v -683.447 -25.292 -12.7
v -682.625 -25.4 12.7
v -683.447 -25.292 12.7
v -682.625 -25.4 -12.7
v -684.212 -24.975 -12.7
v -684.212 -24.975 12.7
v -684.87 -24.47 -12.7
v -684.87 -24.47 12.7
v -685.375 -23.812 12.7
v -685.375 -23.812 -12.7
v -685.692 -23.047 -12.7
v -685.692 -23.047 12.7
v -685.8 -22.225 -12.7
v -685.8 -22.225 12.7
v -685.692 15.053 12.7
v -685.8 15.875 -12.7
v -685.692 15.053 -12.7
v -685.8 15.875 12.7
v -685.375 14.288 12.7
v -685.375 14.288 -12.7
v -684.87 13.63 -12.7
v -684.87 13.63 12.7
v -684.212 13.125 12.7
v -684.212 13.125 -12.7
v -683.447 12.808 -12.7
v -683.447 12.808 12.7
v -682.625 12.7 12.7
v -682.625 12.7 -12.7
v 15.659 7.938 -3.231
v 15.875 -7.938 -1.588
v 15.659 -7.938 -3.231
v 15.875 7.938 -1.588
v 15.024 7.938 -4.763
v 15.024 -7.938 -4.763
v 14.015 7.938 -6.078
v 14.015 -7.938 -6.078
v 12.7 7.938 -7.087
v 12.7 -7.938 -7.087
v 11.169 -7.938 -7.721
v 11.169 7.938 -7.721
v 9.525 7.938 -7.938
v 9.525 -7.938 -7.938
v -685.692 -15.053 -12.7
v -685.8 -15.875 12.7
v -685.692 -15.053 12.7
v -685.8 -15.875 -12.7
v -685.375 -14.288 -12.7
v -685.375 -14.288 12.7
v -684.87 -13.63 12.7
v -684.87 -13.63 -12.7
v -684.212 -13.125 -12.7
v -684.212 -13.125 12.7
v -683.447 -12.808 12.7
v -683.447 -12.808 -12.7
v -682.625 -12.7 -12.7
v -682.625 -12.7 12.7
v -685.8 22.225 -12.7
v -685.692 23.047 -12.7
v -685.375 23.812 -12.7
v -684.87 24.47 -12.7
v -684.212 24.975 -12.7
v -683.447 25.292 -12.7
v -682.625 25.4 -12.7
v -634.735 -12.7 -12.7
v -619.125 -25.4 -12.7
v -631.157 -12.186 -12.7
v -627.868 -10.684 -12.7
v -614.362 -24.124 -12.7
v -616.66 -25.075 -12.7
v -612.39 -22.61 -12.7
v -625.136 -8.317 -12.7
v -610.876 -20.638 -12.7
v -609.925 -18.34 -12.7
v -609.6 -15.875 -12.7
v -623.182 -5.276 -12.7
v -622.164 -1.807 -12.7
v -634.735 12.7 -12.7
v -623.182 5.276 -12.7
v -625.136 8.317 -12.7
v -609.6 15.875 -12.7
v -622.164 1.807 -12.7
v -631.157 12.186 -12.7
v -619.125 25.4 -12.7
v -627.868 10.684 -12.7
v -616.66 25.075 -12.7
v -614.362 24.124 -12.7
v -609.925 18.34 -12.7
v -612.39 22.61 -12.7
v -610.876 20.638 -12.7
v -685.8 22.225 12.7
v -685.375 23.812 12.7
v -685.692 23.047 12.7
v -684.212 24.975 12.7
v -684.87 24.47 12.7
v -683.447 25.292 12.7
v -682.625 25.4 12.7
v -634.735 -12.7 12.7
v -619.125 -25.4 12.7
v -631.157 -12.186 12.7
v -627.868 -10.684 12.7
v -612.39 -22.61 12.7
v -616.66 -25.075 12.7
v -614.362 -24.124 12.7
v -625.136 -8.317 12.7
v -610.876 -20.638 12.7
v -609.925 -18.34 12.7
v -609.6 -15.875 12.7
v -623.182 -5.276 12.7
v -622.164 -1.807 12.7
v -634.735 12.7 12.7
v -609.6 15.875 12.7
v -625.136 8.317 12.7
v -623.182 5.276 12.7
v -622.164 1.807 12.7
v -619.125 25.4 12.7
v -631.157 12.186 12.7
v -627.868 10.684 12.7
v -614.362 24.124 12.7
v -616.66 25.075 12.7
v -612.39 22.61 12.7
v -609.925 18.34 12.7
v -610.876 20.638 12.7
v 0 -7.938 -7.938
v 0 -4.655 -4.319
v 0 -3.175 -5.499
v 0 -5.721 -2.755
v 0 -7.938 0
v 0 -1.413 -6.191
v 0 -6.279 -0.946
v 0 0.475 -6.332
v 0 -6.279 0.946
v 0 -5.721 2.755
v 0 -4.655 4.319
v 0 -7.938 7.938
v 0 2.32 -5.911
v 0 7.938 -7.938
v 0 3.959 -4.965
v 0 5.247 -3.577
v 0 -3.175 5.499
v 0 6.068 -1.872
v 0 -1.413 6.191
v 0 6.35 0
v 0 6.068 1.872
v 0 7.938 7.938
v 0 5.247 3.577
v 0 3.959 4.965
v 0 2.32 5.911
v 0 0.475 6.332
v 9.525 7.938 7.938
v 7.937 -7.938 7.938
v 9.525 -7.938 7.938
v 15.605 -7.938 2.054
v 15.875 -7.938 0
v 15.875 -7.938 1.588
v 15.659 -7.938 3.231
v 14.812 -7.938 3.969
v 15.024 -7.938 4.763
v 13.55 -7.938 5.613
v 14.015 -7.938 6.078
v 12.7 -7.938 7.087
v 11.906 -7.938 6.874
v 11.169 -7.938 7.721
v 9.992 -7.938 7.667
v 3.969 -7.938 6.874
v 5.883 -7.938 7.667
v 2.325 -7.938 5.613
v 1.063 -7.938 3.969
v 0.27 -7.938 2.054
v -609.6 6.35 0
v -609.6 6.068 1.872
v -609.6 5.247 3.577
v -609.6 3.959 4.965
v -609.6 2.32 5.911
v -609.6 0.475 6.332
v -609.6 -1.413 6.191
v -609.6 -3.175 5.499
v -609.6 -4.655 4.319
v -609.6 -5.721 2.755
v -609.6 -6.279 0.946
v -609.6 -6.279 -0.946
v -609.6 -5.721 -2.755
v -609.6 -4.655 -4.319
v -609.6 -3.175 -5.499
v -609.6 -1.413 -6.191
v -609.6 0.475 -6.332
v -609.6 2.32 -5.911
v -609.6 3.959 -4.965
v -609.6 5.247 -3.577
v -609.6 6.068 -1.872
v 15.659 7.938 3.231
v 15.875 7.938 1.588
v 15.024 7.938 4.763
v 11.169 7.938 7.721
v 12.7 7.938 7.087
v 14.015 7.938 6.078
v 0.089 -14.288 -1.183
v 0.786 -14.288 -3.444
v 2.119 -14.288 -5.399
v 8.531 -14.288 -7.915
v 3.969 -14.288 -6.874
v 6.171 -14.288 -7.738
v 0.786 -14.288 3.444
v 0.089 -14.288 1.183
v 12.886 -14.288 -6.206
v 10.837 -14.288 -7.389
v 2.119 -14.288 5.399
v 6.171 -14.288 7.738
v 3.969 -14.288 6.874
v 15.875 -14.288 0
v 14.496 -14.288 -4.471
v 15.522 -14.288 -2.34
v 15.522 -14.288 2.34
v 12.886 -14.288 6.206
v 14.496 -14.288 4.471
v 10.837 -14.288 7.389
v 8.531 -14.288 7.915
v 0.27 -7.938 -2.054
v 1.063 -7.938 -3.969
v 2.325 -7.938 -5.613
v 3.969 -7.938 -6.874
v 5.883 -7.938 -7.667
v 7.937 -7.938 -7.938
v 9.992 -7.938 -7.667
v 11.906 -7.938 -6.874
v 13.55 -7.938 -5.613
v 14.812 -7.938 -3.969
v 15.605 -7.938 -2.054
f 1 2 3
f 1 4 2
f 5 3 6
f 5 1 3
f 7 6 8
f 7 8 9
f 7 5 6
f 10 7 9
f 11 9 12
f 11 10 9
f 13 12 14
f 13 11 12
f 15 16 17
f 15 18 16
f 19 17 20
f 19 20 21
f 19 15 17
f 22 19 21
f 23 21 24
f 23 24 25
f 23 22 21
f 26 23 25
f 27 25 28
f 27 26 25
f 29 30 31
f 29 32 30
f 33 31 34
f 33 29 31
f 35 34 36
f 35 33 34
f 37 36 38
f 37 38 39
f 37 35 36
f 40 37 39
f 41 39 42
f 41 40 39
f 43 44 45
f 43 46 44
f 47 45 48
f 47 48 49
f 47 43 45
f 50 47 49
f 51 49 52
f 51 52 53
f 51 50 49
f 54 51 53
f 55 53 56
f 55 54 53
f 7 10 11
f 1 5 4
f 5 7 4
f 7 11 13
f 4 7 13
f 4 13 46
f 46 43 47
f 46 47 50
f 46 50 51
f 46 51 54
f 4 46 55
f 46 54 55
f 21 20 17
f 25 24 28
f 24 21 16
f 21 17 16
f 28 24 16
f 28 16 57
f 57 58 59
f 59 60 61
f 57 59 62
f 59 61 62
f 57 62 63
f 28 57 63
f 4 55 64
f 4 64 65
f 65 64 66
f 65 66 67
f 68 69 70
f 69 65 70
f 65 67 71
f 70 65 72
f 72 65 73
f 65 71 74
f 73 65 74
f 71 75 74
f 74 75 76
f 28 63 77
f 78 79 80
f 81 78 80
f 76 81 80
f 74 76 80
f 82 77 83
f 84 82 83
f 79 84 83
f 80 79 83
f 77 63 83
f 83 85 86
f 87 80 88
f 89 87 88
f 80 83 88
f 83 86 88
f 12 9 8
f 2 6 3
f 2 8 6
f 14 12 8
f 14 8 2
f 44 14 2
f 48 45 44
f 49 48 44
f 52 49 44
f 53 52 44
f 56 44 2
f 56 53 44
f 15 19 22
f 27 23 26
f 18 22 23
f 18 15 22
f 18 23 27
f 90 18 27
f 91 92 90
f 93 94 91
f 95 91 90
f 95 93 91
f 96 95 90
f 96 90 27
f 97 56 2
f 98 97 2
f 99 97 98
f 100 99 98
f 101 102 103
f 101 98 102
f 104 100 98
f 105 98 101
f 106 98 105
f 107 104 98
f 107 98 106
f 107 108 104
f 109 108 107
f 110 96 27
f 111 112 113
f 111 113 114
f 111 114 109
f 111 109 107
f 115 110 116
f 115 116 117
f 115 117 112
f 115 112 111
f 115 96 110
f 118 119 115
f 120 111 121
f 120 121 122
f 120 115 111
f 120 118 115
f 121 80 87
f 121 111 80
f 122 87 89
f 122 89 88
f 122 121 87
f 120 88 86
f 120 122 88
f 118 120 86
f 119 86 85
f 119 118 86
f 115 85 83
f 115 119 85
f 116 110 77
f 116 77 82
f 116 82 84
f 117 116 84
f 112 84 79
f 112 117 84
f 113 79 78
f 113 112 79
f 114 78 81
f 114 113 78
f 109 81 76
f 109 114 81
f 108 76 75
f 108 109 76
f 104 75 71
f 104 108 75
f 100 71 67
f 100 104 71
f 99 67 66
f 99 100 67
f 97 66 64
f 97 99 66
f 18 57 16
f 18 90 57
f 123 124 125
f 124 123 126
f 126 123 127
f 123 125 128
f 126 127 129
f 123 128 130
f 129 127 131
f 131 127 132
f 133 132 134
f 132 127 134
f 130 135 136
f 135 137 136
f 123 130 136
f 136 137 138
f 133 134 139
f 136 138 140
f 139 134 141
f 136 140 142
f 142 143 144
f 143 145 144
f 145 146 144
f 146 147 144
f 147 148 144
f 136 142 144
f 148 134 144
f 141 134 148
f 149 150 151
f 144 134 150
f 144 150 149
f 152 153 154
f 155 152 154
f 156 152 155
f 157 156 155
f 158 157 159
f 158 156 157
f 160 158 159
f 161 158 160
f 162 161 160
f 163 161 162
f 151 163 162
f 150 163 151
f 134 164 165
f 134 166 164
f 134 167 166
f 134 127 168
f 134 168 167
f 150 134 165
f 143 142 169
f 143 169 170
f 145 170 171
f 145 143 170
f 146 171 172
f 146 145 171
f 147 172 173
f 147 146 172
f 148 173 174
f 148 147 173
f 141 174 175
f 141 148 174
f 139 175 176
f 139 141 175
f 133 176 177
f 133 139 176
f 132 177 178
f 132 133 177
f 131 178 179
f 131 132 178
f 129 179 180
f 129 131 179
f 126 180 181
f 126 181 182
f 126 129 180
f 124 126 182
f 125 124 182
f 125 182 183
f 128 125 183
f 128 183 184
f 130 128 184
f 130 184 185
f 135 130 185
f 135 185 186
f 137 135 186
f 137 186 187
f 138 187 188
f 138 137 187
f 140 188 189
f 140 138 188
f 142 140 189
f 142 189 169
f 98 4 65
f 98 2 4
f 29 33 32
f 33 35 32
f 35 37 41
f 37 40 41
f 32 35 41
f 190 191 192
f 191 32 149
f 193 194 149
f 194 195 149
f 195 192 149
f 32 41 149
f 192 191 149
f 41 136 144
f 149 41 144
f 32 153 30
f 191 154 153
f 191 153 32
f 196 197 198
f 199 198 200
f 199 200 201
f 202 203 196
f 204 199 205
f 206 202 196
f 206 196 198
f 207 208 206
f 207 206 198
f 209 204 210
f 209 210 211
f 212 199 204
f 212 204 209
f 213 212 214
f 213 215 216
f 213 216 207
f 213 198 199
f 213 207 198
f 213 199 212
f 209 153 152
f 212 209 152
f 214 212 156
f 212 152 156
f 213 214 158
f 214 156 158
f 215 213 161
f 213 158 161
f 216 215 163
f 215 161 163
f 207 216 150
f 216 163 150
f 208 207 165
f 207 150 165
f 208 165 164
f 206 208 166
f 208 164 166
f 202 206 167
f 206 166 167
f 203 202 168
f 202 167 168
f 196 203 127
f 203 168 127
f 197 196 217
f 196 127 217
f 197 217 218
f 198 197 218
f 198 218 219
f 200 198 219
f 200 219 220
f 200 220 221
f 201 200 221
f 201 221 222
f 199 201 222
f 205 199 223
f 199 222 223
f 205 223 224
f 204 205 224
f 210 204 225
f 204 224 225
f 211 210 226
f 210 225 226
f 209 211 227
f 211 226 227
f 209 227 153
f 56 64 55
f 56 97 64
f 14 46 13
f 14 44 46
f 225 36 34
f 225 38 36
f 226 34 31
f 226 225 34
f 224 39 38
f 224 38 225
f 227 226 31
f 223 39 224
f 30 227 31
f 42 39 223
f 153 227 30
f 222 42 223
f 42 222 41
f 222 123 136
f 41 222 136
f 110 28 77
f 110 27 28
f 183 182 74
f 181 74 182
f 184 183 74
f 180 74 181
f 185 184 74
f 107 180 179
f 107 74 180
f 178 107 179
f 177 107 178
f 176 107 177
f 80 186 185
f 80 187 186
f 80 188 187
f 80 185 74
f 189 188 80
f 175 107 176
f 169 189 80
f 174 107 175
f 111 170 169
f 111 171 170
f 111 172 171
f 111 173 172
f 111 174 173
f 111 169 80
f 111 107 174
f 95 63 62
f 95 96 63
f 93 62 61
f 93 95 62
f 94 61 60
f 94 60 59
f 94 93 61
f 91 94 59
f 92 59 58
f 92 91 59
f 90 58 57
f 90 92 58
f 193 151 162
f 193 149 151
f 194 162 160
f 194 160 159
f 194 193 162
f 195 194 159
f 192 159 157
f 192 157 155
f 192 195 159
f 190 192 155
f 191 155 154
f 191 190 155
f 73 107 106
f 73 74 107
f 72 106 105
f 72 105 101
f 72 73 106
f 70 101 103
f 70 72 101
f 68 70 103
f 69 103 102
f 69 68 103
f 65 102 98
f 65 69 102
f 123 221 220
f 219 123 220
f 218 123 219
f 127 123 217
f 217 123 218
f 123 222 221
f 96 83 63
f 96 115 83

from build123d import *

# Parameters (mm, degrees)
F0_R     = 6.35
F1_DEPTH = 609.6
F2_W     = 15.875
F2_H     = 15.875
F3_DEPTH = 15.875
F4_R     = 7.9375
F5_DEPTH = 6.35
F6_R     = 6.35
F8_DEPTH = 12.7
F9_R     = 9.525
F10_R    = 3.175


with BuildPart() as f1:
    # F0 (on Right) → F1 (new body)
    with BuildSketch(Plane.YZ):
        Circle(F0_R)
    extrude(amount=-F1_DEPTH)

    # F2 (on Right) → F3 (join)
    with BuildSketch(Plane.YZ):
        Rectangle(F2_W, F2_H)
    extrude(amount=F3_DEPTH)

    # F4 (on face) → F5 (join)
    with BuildSketch(Plane.XZ.offset(7.9375)):
        with Locations((7.9375, 0)):
            Circle(F4_R)
    extrude(amount=F5_DEPTH)

    # F6
    f6_edges = [f1.edges().sort_by_distance(p)[0] for p in [
        (15.875, 0, 7.9375),
        (15.875, 0, -7.9375),
    ]]
    fillet(f6_edges, radius=F6_R)

    # F7 (on Top) → F8 (join, symmetric)
    with BuildSketch(Plane.XY):
        with BuildLine():
            Line((-609.6, -25.4), (-609.6, 25.4))
            Line((-609.6, 25.4), (-685.8, 25.4))
            Line((-685.8, 25.4), (-685.8, 12.7))
            Line((-685.8, 12.7), (-634.7345113754, 12.7))
            ThreePointArc((-634.7345113754, 12.7), (-622.0345113754, 0), (-634.7345113754, -12.7))
            Line((-634.7345113754, -12.7), (-685.8, -12.7))
            Line((-685.8, -12.7), (-685.8, -25.4))
            Line((-685.8, -25.4), (-609.6, -25.4))
        make_face()
    extrude(amount=F8_DEPTH, both=True)

    # F9
    f9_edges = [f1.edges().sort_by_distance(p)[0] for p in [
        (-609.6, 25.4, 0),
        (-609.6, -25.4, 0),
    ]]
    fillet(f9_edges, radius=F9_R)

    # F10
    f10_edges = [f1.edges().sort_by_distance(p)[0] for p in [
        (-685.8, 25.4, 0),
        (-685.8, -25.4, 0),
        (-685.8, 12.7, 0),
        (-685.8, -12.7, 0),
    ]]
    fillet(f10_edges, radius=F10_R)


solid = f1.part
